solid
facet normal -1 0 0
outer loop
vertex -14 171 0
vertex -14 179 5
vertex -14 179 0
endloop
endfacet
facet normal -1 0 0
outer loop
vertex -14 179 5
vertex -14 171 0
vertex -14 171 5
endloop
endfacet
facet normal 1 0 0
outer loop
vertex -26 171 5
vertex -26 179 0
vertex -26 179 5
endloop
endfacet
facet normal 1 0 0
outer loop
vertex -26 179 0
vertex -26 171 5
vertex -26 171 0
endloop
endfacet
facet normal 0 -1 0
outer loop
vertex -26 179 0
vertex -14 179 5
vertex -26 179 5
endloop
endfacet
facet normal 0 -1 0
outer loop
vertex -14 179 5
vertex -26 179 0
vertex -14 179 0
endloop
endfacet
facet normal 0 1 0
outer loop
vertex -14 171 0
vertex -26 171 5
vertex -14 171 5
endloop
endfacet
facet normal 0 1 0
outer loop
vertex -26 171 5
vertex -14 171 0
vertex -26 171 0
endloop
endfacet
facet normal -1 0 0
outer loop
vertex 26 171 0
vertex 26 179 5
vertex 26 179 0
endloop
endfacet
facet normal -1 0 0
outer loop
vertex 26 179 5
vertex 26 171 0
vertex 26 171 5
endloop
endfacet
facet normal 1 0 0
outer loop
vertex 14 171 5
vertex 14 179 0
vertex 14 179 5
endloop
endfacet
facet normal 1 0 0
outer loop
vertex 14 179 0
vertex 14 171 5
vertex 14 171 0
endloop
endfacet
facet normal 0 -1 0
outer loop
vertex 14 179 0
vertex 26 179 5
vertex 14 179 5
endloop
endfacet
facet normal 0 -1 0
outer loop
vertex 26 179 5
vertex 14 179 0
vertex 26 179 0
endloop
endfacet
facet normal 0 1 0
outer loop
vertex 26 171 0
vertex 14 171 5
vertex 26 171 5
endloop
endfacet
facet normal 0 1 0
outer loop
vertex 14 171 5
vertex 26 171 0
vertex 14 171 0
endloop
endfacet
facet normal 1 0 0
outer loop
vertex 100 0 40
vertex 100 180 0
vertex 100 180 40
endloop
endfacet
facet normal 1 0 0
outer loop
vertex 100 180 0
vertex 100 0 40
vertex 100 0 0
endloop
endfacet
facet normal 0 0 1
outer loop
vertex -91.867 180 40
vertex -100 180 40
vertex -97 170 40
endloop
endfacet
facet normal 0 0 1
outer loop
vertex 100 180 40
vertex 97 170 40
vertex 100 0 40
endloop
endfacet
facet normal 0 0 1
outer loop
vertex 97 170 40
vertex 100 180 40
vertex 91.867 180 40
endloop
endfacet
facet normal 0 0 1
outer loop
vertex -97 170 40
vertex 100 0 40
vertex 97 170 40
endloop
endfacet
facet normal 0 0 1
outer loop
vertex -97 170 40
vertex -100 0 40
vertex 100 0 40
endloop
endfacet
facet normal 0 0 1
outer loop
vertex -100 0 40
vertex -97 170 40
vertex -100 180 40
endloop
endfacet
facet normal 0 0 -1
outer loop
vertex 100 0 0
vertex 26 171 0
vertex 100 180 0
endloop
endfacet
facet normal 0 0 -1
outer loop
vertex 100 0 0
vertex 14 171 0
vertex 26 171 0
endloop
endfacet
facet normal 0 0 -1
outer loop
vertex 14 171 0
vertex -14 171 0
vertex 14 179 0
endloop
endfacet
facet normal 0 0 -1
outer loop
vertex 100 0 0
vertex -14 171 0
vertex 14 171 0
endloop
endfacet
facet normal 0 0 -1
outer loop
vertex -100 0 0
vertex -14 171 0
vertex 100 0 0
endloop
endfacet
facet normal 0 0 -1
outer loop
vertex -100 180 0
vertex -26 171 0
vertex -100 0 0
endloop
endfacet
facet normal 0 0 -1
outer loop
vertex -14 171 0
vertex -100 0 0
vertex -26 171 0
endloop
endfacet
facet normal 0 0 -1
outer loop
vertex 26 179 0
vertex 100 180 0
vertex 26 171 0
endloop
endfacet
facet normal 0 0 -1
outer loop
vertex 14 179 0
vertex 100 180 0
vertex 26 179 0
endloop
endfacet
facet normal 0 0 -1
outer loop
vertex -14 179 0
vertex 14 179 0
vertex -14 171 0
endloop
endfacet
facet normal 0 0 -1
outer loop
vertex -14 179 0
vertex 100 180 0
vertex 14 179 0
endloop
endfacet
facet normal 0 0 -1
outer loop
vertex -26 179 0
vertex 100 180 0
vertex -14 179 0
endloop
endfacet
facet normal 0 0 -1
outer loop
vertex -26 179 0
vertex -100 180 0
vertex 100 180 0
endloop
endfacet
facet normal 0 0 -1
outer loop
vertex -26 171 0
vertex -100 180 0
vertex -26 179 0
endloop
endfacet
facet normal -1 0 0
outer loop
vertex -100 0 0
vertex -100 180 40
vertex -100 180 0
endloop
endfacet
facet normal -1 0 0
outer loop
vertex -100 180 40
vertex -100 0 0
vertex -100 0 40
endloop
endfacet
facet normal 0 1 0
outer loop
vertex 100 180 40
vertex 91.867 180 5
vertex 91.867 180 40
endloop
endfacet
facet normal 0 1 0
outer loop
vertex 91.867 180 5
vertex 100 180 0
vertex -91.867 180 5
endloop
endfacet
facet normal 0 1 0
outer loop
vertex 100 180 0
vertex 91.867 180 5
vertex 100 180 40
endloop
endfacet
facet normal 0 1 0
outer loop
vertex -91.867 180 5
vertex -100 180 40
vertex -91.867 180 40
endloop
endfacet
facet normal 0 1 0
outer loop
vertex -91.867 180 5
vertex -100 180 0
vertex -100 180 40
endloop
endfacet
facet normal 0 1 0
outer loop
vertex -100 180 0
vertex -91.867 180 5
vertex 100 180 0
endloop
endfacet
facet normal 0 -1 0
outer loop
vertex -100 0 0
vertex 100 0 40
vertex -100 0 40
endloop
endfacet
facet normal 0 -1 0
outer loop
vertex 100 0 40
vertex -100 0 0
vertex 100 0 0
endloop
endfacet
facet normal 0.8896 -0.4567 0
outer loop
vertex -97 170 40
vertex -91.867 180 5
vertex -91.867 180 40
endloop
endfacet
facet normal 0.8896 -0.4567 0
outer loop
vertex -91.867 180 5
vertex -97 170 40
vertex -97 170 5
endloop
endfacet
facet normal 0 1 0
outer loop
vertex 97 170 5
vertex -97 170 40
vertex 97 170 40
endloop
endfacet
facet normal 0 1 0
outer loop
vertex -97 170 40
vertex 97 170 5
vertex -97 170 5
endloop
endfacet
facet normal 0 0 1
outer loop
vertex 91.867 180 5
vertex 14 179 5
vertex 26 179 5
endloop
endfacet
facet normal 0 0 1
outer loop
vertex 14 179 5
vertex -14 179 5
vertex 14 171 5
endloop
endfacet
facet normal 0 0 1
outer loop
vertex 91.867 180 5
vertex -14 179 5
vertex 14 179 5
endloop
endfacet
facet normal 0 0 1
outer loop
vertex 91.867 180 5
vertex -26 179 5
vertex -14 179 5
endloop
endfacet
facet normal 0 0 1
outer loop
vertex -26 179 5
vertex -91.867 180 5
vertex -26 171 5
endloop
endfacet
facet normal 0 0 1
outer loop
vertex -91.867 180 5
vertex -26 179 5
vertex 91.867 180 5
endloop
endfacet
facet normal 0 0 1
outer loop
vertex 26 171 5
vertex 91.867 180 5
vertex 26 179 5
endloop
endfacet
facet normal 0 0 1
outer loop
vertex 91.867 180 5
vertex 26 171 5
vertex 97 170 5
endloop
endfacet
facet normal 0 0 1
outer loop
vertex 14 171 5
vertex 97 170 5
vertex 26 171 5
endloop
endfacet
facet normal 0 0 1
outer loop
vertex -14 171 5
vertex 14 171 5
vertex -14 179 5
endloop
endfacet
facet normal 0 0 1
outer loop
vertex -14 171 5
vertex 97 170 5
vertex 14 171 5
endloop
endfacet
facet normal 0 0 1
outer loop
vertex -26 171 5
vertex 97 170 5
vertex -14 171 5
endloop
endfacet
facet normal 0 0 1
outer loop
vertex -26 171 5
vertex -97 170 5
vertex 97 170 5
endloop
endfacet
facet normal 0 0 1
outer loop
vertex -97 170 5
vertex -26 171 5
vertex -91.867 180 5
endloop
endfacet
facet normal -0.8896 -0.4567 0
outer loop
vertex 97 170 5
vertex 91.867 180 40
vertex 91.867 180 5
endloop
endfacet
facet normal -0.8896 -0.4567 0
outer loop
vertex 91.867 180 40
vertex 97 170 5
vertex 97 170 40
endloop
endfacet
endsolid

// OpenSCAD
// Charging dock funnel — guides Scout backward onto contacts
// Export: openscad -o dock-funnel.stl dock-funnel.scad

$fn = 60;

funnel_width = 200;
funnel_depth = 180;
wall = 3;
contact_gap = 40;

module funnel() {
  difference() {
    translate([-funnel_width / 2, 0, 0])
      cube([funnel_width, funnel_depth, 40]);
    // V-shaped guide
    translate([0, funnel_depth - 10, 5])
      rotate([0, 0, 0])
        linear_extrude(height = 50)
          polygon(points = [
            [-funnel_width / 2 + wall, 0],
            [funnel_width / 2 - wall, 0],
            [contact_gap / 2, funnel_depth - 30],
            [-contact_gap / 2, funnel_depth - 30]
          ]);
    // contact strip slots
    for (x = [-contact_gap / 2, contact_gap / 2])
      translate([x, funnel_depth - 5, 0])
        cube([12, 8, 15], center = true);
  }
}

funnel();
